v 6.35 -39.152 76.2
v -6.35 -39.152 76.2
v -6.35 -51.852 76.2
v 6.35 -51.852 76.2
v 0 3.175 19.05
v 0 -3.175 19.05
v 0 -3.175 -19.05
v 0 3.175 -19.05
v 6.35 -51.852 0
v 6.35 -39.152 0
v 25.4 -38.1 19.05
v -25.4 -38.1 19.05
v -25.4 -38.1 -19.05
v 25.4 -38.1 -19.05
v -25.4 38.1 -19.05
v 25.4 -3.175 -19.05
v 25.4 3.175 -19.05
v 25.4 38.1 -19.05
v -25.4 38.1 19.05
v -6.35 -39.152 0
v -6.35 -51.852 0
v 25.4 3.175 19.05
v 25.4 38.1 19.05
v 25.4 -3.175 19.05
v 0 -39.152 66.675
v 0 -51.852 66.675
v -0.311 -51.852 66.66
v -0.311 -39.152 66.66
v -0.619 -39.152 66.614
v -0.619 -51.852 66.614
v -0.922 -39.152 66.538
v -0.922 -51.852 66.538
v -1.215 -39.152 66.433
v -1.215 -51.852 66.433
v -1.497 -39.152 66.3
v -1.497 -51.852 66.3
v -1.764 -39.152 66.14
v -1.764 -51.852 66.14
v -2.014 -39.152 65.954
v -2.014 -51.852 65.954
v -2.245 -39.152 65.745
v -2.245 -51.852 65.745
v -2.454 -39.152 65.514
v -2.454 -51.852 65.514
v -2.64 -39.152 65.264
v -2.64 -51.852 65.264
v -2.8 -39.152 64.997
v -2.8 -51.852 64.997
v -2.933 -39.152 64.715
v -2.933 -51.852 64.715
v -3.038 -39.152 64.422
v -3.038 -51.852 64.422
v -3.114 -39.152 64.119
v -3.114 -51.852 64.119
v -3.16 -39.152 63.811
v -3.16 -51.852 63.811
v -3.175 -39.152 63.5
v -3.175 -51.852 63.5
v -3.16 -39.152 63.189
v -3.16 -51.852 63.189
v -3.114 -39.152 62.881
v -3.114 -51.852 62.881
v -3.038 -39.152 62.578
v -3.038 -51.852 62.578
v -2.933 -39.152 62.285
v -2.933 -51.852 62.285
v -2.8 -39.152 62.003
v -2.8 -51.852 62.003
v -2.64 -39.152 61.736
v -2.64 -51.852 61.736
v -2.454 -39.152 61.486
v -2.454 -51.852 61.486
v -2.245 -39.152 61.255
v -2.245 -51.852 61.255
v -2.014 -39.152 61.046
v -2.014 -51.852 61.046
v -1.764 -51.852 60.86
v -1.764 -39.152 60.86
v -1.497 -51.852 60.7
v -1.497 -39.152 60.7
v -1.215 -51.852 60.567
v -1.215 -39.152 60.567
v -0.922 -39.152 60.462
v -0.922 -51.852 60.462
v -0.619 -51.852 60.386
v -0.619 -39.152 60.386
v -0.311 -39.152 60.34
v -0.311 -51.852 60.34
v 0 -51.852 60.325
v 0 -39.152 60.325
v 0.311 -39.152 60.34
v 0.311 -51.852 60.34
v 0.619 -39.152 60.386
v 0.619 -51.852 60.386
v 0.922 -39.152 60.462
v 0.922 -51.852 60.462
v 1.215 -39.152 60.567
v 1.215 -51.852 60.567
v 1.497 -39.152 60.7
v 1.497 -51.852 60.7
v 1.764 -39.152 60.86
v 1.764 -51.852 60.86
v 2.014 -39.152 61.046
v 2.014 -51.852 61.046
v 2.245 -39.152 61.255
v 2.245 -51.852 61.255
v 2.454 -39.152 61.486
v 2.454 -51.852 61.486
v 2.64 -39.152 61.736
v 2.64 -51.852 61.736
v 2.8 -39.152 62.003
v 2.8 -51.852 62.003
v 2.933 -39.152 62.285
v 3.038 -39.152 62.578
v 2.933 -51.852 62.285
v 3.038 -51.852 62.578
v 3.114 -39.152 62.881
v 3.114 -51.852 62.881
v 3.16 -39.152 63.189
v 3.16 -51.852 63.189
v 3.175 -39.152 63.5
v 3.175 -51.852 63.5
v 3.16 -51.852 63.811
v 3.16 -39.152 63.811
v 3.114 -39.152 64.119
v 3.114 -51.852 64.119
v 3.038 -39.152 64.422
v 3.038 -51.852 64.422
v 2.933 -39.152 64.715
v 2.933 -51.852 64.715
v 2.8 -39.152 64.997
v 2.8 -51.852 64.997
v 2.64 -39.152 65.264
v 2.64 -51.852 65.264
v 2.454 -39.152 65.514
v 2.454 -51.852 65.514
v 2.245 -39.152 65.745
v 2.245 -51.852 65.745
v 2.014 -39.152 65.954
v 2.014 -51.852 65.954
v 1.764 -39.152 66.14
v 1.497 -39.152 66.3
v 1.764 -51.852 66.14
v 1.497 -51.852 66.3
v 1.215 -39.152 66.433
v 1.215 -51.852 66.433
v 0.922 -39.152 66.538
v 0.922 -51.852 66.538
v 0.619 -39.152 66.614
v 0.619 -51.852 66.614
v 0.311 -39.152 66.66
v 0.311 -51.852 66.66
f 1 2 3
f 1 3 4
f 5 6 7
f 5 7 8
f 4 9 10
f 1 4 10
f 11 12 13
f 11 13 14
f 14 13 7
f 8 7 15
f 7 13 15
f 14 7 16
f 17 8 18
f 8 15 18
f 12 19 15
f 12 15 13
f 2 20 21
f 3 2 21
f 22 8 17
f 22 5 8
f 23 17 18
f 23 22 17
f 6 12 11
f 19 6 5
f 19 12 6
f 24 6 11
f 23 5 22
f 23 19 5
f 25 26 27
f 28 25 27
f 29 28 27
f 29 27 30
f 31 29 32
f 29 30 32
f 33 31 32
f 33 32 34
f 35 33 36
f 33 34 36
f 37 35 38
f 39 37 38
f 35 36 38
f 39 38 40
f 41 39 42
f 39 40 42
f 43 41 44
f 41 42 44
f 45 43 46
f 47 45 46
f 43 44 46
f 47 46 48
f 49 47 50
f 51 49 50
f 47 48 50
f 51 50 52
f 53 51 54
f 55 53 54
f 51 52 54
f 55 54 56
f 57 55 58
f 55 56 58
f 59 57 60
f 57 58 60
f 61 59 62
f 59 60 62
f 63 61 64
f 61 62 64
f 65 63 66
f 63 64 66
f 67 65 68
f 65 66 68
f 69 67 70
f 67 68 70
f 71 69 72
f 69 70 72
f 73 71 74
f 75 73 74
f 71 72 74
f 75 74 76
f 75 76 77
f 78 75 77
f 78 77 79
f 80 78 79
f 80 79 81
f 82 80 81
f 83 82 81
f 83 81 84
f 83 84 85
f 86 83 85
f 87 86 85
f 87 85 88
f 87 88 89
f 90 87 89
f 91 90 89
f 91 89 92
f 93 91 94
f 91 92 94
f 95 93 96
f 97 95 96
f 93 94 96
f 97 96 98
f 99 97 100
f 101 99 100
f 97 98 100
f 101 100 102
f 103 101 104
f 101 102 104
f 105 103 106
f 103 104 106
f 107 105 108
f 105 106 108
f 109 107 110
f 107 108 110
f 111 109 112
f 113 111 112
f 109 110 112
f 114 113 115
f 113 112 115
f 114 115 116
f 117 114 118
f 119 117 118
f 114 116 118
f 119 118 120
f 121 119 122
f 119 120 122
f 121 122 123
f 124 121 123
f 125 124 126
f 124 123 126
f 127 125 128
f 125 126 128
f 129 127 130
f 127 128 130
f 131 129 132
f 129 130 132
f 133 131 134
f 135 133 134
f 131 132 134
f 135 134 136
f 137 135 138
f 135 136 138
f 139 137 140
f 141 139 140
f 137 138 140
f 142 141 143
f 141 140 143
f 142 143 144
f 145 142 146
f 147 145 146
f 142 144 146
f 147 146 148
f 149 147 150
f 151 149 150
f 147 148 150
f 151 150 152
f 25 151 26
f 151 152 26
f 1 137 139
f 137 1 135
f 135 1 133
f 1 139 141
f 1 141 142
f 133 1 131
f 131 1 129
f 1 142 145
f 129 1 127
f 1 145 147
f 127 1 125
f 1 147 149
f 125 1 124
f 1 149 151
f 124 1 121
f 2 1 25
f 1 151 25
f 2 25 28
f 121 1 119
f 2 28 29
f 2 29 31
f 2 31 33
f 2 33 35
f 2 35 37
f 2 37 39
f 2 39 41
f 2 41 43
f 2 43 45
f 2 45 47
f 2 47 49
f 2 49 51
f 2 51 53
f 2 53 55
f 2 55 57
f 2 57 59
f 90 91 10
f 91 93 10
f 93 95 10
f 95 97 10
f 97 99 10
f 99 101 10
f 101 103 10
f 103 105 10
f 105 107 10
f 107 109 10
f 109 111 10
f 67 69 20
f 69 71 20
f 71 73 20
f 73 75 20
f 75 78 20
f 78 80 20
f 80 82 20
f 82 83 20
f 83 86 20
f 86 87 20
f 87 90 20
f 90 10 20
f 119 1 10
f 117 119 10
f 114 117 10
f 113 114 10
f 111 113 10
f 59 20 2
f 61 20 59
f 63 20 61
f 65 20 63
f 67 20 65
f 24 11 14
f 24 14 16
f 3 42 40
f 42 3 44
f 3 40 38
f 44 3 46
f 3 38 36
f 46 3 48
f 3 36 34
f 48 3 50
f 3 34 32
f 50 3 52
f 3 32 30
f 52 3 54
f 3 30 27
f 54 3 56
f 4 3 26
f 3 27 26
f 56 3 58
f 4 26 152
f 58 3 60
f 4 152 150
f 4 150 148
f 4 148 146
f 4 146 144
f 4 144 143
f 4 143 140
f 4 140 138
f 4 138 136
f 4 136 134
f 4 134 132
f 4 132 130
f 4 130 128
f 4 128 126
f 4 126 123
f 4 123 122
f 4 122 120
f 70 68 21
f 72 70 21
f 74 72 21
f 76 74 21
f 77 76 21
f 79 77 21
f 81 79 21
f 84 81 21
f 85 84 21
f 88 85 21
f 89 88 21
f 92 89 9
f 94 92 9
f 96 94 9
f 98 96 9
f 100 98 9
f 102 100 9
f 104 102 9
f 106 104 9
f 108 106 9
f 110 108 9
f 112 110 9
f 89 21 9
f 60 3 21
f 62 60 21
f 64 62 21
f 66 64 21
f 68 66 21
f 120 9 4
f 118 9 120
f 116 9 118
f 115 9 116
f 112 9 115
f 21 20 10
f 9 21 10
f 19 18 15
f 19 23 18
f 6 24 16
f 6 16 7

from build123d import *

# Parameters (mm, degrees)
F2_DEPTH = 19.05
F3_DEPTH = 76.2
F5_DEPTH = 25.4


with BuildPart() as f2:
    # F0 (on Top) → F2 (new body, symmetric)
    with BuildSketch(Plane.XY):
        Polygon((25.4, 38.1), (-25.4, 38.1), (-25.4, -38.1), (25.4, -38.1), (25.4, -3.175), (0, -3.175), (0, 0), (0, 3.175), (25.4, 3.175), align=None)
    extrude(amount=F2_DEPTH, both=True)


with BuildPart() as f3:
    # F1 (on Top) → F3 (new body)
    with BuildSketch(Plane.XY):
        Polygon((6.35, -39.151846), (0, -39.151846), (-6.35, -39.151846), (-6.35, -51.851846), (6.35, -51.851846), align=None)
    extrude(amount=F3_DEPTH)

    # F4 (on face) → F5 (cut, symmetric)
    with BuildSketch(Plane.XZ.offset(51.851846)):
        with BuildLine():
            ThreePointArc((3.175, 63.5), (2.245064, 65.745064), (0, 66.675))
            ThreePointArc((0, 66.675), (-2.245064, 61.254936), (3.175, 63.5))
        make_face()
    extrude(amount=F5_DEPTH, both=True, mode=Mode.SUBTRACT)


solid = Compound([f2.part, f3.part])
